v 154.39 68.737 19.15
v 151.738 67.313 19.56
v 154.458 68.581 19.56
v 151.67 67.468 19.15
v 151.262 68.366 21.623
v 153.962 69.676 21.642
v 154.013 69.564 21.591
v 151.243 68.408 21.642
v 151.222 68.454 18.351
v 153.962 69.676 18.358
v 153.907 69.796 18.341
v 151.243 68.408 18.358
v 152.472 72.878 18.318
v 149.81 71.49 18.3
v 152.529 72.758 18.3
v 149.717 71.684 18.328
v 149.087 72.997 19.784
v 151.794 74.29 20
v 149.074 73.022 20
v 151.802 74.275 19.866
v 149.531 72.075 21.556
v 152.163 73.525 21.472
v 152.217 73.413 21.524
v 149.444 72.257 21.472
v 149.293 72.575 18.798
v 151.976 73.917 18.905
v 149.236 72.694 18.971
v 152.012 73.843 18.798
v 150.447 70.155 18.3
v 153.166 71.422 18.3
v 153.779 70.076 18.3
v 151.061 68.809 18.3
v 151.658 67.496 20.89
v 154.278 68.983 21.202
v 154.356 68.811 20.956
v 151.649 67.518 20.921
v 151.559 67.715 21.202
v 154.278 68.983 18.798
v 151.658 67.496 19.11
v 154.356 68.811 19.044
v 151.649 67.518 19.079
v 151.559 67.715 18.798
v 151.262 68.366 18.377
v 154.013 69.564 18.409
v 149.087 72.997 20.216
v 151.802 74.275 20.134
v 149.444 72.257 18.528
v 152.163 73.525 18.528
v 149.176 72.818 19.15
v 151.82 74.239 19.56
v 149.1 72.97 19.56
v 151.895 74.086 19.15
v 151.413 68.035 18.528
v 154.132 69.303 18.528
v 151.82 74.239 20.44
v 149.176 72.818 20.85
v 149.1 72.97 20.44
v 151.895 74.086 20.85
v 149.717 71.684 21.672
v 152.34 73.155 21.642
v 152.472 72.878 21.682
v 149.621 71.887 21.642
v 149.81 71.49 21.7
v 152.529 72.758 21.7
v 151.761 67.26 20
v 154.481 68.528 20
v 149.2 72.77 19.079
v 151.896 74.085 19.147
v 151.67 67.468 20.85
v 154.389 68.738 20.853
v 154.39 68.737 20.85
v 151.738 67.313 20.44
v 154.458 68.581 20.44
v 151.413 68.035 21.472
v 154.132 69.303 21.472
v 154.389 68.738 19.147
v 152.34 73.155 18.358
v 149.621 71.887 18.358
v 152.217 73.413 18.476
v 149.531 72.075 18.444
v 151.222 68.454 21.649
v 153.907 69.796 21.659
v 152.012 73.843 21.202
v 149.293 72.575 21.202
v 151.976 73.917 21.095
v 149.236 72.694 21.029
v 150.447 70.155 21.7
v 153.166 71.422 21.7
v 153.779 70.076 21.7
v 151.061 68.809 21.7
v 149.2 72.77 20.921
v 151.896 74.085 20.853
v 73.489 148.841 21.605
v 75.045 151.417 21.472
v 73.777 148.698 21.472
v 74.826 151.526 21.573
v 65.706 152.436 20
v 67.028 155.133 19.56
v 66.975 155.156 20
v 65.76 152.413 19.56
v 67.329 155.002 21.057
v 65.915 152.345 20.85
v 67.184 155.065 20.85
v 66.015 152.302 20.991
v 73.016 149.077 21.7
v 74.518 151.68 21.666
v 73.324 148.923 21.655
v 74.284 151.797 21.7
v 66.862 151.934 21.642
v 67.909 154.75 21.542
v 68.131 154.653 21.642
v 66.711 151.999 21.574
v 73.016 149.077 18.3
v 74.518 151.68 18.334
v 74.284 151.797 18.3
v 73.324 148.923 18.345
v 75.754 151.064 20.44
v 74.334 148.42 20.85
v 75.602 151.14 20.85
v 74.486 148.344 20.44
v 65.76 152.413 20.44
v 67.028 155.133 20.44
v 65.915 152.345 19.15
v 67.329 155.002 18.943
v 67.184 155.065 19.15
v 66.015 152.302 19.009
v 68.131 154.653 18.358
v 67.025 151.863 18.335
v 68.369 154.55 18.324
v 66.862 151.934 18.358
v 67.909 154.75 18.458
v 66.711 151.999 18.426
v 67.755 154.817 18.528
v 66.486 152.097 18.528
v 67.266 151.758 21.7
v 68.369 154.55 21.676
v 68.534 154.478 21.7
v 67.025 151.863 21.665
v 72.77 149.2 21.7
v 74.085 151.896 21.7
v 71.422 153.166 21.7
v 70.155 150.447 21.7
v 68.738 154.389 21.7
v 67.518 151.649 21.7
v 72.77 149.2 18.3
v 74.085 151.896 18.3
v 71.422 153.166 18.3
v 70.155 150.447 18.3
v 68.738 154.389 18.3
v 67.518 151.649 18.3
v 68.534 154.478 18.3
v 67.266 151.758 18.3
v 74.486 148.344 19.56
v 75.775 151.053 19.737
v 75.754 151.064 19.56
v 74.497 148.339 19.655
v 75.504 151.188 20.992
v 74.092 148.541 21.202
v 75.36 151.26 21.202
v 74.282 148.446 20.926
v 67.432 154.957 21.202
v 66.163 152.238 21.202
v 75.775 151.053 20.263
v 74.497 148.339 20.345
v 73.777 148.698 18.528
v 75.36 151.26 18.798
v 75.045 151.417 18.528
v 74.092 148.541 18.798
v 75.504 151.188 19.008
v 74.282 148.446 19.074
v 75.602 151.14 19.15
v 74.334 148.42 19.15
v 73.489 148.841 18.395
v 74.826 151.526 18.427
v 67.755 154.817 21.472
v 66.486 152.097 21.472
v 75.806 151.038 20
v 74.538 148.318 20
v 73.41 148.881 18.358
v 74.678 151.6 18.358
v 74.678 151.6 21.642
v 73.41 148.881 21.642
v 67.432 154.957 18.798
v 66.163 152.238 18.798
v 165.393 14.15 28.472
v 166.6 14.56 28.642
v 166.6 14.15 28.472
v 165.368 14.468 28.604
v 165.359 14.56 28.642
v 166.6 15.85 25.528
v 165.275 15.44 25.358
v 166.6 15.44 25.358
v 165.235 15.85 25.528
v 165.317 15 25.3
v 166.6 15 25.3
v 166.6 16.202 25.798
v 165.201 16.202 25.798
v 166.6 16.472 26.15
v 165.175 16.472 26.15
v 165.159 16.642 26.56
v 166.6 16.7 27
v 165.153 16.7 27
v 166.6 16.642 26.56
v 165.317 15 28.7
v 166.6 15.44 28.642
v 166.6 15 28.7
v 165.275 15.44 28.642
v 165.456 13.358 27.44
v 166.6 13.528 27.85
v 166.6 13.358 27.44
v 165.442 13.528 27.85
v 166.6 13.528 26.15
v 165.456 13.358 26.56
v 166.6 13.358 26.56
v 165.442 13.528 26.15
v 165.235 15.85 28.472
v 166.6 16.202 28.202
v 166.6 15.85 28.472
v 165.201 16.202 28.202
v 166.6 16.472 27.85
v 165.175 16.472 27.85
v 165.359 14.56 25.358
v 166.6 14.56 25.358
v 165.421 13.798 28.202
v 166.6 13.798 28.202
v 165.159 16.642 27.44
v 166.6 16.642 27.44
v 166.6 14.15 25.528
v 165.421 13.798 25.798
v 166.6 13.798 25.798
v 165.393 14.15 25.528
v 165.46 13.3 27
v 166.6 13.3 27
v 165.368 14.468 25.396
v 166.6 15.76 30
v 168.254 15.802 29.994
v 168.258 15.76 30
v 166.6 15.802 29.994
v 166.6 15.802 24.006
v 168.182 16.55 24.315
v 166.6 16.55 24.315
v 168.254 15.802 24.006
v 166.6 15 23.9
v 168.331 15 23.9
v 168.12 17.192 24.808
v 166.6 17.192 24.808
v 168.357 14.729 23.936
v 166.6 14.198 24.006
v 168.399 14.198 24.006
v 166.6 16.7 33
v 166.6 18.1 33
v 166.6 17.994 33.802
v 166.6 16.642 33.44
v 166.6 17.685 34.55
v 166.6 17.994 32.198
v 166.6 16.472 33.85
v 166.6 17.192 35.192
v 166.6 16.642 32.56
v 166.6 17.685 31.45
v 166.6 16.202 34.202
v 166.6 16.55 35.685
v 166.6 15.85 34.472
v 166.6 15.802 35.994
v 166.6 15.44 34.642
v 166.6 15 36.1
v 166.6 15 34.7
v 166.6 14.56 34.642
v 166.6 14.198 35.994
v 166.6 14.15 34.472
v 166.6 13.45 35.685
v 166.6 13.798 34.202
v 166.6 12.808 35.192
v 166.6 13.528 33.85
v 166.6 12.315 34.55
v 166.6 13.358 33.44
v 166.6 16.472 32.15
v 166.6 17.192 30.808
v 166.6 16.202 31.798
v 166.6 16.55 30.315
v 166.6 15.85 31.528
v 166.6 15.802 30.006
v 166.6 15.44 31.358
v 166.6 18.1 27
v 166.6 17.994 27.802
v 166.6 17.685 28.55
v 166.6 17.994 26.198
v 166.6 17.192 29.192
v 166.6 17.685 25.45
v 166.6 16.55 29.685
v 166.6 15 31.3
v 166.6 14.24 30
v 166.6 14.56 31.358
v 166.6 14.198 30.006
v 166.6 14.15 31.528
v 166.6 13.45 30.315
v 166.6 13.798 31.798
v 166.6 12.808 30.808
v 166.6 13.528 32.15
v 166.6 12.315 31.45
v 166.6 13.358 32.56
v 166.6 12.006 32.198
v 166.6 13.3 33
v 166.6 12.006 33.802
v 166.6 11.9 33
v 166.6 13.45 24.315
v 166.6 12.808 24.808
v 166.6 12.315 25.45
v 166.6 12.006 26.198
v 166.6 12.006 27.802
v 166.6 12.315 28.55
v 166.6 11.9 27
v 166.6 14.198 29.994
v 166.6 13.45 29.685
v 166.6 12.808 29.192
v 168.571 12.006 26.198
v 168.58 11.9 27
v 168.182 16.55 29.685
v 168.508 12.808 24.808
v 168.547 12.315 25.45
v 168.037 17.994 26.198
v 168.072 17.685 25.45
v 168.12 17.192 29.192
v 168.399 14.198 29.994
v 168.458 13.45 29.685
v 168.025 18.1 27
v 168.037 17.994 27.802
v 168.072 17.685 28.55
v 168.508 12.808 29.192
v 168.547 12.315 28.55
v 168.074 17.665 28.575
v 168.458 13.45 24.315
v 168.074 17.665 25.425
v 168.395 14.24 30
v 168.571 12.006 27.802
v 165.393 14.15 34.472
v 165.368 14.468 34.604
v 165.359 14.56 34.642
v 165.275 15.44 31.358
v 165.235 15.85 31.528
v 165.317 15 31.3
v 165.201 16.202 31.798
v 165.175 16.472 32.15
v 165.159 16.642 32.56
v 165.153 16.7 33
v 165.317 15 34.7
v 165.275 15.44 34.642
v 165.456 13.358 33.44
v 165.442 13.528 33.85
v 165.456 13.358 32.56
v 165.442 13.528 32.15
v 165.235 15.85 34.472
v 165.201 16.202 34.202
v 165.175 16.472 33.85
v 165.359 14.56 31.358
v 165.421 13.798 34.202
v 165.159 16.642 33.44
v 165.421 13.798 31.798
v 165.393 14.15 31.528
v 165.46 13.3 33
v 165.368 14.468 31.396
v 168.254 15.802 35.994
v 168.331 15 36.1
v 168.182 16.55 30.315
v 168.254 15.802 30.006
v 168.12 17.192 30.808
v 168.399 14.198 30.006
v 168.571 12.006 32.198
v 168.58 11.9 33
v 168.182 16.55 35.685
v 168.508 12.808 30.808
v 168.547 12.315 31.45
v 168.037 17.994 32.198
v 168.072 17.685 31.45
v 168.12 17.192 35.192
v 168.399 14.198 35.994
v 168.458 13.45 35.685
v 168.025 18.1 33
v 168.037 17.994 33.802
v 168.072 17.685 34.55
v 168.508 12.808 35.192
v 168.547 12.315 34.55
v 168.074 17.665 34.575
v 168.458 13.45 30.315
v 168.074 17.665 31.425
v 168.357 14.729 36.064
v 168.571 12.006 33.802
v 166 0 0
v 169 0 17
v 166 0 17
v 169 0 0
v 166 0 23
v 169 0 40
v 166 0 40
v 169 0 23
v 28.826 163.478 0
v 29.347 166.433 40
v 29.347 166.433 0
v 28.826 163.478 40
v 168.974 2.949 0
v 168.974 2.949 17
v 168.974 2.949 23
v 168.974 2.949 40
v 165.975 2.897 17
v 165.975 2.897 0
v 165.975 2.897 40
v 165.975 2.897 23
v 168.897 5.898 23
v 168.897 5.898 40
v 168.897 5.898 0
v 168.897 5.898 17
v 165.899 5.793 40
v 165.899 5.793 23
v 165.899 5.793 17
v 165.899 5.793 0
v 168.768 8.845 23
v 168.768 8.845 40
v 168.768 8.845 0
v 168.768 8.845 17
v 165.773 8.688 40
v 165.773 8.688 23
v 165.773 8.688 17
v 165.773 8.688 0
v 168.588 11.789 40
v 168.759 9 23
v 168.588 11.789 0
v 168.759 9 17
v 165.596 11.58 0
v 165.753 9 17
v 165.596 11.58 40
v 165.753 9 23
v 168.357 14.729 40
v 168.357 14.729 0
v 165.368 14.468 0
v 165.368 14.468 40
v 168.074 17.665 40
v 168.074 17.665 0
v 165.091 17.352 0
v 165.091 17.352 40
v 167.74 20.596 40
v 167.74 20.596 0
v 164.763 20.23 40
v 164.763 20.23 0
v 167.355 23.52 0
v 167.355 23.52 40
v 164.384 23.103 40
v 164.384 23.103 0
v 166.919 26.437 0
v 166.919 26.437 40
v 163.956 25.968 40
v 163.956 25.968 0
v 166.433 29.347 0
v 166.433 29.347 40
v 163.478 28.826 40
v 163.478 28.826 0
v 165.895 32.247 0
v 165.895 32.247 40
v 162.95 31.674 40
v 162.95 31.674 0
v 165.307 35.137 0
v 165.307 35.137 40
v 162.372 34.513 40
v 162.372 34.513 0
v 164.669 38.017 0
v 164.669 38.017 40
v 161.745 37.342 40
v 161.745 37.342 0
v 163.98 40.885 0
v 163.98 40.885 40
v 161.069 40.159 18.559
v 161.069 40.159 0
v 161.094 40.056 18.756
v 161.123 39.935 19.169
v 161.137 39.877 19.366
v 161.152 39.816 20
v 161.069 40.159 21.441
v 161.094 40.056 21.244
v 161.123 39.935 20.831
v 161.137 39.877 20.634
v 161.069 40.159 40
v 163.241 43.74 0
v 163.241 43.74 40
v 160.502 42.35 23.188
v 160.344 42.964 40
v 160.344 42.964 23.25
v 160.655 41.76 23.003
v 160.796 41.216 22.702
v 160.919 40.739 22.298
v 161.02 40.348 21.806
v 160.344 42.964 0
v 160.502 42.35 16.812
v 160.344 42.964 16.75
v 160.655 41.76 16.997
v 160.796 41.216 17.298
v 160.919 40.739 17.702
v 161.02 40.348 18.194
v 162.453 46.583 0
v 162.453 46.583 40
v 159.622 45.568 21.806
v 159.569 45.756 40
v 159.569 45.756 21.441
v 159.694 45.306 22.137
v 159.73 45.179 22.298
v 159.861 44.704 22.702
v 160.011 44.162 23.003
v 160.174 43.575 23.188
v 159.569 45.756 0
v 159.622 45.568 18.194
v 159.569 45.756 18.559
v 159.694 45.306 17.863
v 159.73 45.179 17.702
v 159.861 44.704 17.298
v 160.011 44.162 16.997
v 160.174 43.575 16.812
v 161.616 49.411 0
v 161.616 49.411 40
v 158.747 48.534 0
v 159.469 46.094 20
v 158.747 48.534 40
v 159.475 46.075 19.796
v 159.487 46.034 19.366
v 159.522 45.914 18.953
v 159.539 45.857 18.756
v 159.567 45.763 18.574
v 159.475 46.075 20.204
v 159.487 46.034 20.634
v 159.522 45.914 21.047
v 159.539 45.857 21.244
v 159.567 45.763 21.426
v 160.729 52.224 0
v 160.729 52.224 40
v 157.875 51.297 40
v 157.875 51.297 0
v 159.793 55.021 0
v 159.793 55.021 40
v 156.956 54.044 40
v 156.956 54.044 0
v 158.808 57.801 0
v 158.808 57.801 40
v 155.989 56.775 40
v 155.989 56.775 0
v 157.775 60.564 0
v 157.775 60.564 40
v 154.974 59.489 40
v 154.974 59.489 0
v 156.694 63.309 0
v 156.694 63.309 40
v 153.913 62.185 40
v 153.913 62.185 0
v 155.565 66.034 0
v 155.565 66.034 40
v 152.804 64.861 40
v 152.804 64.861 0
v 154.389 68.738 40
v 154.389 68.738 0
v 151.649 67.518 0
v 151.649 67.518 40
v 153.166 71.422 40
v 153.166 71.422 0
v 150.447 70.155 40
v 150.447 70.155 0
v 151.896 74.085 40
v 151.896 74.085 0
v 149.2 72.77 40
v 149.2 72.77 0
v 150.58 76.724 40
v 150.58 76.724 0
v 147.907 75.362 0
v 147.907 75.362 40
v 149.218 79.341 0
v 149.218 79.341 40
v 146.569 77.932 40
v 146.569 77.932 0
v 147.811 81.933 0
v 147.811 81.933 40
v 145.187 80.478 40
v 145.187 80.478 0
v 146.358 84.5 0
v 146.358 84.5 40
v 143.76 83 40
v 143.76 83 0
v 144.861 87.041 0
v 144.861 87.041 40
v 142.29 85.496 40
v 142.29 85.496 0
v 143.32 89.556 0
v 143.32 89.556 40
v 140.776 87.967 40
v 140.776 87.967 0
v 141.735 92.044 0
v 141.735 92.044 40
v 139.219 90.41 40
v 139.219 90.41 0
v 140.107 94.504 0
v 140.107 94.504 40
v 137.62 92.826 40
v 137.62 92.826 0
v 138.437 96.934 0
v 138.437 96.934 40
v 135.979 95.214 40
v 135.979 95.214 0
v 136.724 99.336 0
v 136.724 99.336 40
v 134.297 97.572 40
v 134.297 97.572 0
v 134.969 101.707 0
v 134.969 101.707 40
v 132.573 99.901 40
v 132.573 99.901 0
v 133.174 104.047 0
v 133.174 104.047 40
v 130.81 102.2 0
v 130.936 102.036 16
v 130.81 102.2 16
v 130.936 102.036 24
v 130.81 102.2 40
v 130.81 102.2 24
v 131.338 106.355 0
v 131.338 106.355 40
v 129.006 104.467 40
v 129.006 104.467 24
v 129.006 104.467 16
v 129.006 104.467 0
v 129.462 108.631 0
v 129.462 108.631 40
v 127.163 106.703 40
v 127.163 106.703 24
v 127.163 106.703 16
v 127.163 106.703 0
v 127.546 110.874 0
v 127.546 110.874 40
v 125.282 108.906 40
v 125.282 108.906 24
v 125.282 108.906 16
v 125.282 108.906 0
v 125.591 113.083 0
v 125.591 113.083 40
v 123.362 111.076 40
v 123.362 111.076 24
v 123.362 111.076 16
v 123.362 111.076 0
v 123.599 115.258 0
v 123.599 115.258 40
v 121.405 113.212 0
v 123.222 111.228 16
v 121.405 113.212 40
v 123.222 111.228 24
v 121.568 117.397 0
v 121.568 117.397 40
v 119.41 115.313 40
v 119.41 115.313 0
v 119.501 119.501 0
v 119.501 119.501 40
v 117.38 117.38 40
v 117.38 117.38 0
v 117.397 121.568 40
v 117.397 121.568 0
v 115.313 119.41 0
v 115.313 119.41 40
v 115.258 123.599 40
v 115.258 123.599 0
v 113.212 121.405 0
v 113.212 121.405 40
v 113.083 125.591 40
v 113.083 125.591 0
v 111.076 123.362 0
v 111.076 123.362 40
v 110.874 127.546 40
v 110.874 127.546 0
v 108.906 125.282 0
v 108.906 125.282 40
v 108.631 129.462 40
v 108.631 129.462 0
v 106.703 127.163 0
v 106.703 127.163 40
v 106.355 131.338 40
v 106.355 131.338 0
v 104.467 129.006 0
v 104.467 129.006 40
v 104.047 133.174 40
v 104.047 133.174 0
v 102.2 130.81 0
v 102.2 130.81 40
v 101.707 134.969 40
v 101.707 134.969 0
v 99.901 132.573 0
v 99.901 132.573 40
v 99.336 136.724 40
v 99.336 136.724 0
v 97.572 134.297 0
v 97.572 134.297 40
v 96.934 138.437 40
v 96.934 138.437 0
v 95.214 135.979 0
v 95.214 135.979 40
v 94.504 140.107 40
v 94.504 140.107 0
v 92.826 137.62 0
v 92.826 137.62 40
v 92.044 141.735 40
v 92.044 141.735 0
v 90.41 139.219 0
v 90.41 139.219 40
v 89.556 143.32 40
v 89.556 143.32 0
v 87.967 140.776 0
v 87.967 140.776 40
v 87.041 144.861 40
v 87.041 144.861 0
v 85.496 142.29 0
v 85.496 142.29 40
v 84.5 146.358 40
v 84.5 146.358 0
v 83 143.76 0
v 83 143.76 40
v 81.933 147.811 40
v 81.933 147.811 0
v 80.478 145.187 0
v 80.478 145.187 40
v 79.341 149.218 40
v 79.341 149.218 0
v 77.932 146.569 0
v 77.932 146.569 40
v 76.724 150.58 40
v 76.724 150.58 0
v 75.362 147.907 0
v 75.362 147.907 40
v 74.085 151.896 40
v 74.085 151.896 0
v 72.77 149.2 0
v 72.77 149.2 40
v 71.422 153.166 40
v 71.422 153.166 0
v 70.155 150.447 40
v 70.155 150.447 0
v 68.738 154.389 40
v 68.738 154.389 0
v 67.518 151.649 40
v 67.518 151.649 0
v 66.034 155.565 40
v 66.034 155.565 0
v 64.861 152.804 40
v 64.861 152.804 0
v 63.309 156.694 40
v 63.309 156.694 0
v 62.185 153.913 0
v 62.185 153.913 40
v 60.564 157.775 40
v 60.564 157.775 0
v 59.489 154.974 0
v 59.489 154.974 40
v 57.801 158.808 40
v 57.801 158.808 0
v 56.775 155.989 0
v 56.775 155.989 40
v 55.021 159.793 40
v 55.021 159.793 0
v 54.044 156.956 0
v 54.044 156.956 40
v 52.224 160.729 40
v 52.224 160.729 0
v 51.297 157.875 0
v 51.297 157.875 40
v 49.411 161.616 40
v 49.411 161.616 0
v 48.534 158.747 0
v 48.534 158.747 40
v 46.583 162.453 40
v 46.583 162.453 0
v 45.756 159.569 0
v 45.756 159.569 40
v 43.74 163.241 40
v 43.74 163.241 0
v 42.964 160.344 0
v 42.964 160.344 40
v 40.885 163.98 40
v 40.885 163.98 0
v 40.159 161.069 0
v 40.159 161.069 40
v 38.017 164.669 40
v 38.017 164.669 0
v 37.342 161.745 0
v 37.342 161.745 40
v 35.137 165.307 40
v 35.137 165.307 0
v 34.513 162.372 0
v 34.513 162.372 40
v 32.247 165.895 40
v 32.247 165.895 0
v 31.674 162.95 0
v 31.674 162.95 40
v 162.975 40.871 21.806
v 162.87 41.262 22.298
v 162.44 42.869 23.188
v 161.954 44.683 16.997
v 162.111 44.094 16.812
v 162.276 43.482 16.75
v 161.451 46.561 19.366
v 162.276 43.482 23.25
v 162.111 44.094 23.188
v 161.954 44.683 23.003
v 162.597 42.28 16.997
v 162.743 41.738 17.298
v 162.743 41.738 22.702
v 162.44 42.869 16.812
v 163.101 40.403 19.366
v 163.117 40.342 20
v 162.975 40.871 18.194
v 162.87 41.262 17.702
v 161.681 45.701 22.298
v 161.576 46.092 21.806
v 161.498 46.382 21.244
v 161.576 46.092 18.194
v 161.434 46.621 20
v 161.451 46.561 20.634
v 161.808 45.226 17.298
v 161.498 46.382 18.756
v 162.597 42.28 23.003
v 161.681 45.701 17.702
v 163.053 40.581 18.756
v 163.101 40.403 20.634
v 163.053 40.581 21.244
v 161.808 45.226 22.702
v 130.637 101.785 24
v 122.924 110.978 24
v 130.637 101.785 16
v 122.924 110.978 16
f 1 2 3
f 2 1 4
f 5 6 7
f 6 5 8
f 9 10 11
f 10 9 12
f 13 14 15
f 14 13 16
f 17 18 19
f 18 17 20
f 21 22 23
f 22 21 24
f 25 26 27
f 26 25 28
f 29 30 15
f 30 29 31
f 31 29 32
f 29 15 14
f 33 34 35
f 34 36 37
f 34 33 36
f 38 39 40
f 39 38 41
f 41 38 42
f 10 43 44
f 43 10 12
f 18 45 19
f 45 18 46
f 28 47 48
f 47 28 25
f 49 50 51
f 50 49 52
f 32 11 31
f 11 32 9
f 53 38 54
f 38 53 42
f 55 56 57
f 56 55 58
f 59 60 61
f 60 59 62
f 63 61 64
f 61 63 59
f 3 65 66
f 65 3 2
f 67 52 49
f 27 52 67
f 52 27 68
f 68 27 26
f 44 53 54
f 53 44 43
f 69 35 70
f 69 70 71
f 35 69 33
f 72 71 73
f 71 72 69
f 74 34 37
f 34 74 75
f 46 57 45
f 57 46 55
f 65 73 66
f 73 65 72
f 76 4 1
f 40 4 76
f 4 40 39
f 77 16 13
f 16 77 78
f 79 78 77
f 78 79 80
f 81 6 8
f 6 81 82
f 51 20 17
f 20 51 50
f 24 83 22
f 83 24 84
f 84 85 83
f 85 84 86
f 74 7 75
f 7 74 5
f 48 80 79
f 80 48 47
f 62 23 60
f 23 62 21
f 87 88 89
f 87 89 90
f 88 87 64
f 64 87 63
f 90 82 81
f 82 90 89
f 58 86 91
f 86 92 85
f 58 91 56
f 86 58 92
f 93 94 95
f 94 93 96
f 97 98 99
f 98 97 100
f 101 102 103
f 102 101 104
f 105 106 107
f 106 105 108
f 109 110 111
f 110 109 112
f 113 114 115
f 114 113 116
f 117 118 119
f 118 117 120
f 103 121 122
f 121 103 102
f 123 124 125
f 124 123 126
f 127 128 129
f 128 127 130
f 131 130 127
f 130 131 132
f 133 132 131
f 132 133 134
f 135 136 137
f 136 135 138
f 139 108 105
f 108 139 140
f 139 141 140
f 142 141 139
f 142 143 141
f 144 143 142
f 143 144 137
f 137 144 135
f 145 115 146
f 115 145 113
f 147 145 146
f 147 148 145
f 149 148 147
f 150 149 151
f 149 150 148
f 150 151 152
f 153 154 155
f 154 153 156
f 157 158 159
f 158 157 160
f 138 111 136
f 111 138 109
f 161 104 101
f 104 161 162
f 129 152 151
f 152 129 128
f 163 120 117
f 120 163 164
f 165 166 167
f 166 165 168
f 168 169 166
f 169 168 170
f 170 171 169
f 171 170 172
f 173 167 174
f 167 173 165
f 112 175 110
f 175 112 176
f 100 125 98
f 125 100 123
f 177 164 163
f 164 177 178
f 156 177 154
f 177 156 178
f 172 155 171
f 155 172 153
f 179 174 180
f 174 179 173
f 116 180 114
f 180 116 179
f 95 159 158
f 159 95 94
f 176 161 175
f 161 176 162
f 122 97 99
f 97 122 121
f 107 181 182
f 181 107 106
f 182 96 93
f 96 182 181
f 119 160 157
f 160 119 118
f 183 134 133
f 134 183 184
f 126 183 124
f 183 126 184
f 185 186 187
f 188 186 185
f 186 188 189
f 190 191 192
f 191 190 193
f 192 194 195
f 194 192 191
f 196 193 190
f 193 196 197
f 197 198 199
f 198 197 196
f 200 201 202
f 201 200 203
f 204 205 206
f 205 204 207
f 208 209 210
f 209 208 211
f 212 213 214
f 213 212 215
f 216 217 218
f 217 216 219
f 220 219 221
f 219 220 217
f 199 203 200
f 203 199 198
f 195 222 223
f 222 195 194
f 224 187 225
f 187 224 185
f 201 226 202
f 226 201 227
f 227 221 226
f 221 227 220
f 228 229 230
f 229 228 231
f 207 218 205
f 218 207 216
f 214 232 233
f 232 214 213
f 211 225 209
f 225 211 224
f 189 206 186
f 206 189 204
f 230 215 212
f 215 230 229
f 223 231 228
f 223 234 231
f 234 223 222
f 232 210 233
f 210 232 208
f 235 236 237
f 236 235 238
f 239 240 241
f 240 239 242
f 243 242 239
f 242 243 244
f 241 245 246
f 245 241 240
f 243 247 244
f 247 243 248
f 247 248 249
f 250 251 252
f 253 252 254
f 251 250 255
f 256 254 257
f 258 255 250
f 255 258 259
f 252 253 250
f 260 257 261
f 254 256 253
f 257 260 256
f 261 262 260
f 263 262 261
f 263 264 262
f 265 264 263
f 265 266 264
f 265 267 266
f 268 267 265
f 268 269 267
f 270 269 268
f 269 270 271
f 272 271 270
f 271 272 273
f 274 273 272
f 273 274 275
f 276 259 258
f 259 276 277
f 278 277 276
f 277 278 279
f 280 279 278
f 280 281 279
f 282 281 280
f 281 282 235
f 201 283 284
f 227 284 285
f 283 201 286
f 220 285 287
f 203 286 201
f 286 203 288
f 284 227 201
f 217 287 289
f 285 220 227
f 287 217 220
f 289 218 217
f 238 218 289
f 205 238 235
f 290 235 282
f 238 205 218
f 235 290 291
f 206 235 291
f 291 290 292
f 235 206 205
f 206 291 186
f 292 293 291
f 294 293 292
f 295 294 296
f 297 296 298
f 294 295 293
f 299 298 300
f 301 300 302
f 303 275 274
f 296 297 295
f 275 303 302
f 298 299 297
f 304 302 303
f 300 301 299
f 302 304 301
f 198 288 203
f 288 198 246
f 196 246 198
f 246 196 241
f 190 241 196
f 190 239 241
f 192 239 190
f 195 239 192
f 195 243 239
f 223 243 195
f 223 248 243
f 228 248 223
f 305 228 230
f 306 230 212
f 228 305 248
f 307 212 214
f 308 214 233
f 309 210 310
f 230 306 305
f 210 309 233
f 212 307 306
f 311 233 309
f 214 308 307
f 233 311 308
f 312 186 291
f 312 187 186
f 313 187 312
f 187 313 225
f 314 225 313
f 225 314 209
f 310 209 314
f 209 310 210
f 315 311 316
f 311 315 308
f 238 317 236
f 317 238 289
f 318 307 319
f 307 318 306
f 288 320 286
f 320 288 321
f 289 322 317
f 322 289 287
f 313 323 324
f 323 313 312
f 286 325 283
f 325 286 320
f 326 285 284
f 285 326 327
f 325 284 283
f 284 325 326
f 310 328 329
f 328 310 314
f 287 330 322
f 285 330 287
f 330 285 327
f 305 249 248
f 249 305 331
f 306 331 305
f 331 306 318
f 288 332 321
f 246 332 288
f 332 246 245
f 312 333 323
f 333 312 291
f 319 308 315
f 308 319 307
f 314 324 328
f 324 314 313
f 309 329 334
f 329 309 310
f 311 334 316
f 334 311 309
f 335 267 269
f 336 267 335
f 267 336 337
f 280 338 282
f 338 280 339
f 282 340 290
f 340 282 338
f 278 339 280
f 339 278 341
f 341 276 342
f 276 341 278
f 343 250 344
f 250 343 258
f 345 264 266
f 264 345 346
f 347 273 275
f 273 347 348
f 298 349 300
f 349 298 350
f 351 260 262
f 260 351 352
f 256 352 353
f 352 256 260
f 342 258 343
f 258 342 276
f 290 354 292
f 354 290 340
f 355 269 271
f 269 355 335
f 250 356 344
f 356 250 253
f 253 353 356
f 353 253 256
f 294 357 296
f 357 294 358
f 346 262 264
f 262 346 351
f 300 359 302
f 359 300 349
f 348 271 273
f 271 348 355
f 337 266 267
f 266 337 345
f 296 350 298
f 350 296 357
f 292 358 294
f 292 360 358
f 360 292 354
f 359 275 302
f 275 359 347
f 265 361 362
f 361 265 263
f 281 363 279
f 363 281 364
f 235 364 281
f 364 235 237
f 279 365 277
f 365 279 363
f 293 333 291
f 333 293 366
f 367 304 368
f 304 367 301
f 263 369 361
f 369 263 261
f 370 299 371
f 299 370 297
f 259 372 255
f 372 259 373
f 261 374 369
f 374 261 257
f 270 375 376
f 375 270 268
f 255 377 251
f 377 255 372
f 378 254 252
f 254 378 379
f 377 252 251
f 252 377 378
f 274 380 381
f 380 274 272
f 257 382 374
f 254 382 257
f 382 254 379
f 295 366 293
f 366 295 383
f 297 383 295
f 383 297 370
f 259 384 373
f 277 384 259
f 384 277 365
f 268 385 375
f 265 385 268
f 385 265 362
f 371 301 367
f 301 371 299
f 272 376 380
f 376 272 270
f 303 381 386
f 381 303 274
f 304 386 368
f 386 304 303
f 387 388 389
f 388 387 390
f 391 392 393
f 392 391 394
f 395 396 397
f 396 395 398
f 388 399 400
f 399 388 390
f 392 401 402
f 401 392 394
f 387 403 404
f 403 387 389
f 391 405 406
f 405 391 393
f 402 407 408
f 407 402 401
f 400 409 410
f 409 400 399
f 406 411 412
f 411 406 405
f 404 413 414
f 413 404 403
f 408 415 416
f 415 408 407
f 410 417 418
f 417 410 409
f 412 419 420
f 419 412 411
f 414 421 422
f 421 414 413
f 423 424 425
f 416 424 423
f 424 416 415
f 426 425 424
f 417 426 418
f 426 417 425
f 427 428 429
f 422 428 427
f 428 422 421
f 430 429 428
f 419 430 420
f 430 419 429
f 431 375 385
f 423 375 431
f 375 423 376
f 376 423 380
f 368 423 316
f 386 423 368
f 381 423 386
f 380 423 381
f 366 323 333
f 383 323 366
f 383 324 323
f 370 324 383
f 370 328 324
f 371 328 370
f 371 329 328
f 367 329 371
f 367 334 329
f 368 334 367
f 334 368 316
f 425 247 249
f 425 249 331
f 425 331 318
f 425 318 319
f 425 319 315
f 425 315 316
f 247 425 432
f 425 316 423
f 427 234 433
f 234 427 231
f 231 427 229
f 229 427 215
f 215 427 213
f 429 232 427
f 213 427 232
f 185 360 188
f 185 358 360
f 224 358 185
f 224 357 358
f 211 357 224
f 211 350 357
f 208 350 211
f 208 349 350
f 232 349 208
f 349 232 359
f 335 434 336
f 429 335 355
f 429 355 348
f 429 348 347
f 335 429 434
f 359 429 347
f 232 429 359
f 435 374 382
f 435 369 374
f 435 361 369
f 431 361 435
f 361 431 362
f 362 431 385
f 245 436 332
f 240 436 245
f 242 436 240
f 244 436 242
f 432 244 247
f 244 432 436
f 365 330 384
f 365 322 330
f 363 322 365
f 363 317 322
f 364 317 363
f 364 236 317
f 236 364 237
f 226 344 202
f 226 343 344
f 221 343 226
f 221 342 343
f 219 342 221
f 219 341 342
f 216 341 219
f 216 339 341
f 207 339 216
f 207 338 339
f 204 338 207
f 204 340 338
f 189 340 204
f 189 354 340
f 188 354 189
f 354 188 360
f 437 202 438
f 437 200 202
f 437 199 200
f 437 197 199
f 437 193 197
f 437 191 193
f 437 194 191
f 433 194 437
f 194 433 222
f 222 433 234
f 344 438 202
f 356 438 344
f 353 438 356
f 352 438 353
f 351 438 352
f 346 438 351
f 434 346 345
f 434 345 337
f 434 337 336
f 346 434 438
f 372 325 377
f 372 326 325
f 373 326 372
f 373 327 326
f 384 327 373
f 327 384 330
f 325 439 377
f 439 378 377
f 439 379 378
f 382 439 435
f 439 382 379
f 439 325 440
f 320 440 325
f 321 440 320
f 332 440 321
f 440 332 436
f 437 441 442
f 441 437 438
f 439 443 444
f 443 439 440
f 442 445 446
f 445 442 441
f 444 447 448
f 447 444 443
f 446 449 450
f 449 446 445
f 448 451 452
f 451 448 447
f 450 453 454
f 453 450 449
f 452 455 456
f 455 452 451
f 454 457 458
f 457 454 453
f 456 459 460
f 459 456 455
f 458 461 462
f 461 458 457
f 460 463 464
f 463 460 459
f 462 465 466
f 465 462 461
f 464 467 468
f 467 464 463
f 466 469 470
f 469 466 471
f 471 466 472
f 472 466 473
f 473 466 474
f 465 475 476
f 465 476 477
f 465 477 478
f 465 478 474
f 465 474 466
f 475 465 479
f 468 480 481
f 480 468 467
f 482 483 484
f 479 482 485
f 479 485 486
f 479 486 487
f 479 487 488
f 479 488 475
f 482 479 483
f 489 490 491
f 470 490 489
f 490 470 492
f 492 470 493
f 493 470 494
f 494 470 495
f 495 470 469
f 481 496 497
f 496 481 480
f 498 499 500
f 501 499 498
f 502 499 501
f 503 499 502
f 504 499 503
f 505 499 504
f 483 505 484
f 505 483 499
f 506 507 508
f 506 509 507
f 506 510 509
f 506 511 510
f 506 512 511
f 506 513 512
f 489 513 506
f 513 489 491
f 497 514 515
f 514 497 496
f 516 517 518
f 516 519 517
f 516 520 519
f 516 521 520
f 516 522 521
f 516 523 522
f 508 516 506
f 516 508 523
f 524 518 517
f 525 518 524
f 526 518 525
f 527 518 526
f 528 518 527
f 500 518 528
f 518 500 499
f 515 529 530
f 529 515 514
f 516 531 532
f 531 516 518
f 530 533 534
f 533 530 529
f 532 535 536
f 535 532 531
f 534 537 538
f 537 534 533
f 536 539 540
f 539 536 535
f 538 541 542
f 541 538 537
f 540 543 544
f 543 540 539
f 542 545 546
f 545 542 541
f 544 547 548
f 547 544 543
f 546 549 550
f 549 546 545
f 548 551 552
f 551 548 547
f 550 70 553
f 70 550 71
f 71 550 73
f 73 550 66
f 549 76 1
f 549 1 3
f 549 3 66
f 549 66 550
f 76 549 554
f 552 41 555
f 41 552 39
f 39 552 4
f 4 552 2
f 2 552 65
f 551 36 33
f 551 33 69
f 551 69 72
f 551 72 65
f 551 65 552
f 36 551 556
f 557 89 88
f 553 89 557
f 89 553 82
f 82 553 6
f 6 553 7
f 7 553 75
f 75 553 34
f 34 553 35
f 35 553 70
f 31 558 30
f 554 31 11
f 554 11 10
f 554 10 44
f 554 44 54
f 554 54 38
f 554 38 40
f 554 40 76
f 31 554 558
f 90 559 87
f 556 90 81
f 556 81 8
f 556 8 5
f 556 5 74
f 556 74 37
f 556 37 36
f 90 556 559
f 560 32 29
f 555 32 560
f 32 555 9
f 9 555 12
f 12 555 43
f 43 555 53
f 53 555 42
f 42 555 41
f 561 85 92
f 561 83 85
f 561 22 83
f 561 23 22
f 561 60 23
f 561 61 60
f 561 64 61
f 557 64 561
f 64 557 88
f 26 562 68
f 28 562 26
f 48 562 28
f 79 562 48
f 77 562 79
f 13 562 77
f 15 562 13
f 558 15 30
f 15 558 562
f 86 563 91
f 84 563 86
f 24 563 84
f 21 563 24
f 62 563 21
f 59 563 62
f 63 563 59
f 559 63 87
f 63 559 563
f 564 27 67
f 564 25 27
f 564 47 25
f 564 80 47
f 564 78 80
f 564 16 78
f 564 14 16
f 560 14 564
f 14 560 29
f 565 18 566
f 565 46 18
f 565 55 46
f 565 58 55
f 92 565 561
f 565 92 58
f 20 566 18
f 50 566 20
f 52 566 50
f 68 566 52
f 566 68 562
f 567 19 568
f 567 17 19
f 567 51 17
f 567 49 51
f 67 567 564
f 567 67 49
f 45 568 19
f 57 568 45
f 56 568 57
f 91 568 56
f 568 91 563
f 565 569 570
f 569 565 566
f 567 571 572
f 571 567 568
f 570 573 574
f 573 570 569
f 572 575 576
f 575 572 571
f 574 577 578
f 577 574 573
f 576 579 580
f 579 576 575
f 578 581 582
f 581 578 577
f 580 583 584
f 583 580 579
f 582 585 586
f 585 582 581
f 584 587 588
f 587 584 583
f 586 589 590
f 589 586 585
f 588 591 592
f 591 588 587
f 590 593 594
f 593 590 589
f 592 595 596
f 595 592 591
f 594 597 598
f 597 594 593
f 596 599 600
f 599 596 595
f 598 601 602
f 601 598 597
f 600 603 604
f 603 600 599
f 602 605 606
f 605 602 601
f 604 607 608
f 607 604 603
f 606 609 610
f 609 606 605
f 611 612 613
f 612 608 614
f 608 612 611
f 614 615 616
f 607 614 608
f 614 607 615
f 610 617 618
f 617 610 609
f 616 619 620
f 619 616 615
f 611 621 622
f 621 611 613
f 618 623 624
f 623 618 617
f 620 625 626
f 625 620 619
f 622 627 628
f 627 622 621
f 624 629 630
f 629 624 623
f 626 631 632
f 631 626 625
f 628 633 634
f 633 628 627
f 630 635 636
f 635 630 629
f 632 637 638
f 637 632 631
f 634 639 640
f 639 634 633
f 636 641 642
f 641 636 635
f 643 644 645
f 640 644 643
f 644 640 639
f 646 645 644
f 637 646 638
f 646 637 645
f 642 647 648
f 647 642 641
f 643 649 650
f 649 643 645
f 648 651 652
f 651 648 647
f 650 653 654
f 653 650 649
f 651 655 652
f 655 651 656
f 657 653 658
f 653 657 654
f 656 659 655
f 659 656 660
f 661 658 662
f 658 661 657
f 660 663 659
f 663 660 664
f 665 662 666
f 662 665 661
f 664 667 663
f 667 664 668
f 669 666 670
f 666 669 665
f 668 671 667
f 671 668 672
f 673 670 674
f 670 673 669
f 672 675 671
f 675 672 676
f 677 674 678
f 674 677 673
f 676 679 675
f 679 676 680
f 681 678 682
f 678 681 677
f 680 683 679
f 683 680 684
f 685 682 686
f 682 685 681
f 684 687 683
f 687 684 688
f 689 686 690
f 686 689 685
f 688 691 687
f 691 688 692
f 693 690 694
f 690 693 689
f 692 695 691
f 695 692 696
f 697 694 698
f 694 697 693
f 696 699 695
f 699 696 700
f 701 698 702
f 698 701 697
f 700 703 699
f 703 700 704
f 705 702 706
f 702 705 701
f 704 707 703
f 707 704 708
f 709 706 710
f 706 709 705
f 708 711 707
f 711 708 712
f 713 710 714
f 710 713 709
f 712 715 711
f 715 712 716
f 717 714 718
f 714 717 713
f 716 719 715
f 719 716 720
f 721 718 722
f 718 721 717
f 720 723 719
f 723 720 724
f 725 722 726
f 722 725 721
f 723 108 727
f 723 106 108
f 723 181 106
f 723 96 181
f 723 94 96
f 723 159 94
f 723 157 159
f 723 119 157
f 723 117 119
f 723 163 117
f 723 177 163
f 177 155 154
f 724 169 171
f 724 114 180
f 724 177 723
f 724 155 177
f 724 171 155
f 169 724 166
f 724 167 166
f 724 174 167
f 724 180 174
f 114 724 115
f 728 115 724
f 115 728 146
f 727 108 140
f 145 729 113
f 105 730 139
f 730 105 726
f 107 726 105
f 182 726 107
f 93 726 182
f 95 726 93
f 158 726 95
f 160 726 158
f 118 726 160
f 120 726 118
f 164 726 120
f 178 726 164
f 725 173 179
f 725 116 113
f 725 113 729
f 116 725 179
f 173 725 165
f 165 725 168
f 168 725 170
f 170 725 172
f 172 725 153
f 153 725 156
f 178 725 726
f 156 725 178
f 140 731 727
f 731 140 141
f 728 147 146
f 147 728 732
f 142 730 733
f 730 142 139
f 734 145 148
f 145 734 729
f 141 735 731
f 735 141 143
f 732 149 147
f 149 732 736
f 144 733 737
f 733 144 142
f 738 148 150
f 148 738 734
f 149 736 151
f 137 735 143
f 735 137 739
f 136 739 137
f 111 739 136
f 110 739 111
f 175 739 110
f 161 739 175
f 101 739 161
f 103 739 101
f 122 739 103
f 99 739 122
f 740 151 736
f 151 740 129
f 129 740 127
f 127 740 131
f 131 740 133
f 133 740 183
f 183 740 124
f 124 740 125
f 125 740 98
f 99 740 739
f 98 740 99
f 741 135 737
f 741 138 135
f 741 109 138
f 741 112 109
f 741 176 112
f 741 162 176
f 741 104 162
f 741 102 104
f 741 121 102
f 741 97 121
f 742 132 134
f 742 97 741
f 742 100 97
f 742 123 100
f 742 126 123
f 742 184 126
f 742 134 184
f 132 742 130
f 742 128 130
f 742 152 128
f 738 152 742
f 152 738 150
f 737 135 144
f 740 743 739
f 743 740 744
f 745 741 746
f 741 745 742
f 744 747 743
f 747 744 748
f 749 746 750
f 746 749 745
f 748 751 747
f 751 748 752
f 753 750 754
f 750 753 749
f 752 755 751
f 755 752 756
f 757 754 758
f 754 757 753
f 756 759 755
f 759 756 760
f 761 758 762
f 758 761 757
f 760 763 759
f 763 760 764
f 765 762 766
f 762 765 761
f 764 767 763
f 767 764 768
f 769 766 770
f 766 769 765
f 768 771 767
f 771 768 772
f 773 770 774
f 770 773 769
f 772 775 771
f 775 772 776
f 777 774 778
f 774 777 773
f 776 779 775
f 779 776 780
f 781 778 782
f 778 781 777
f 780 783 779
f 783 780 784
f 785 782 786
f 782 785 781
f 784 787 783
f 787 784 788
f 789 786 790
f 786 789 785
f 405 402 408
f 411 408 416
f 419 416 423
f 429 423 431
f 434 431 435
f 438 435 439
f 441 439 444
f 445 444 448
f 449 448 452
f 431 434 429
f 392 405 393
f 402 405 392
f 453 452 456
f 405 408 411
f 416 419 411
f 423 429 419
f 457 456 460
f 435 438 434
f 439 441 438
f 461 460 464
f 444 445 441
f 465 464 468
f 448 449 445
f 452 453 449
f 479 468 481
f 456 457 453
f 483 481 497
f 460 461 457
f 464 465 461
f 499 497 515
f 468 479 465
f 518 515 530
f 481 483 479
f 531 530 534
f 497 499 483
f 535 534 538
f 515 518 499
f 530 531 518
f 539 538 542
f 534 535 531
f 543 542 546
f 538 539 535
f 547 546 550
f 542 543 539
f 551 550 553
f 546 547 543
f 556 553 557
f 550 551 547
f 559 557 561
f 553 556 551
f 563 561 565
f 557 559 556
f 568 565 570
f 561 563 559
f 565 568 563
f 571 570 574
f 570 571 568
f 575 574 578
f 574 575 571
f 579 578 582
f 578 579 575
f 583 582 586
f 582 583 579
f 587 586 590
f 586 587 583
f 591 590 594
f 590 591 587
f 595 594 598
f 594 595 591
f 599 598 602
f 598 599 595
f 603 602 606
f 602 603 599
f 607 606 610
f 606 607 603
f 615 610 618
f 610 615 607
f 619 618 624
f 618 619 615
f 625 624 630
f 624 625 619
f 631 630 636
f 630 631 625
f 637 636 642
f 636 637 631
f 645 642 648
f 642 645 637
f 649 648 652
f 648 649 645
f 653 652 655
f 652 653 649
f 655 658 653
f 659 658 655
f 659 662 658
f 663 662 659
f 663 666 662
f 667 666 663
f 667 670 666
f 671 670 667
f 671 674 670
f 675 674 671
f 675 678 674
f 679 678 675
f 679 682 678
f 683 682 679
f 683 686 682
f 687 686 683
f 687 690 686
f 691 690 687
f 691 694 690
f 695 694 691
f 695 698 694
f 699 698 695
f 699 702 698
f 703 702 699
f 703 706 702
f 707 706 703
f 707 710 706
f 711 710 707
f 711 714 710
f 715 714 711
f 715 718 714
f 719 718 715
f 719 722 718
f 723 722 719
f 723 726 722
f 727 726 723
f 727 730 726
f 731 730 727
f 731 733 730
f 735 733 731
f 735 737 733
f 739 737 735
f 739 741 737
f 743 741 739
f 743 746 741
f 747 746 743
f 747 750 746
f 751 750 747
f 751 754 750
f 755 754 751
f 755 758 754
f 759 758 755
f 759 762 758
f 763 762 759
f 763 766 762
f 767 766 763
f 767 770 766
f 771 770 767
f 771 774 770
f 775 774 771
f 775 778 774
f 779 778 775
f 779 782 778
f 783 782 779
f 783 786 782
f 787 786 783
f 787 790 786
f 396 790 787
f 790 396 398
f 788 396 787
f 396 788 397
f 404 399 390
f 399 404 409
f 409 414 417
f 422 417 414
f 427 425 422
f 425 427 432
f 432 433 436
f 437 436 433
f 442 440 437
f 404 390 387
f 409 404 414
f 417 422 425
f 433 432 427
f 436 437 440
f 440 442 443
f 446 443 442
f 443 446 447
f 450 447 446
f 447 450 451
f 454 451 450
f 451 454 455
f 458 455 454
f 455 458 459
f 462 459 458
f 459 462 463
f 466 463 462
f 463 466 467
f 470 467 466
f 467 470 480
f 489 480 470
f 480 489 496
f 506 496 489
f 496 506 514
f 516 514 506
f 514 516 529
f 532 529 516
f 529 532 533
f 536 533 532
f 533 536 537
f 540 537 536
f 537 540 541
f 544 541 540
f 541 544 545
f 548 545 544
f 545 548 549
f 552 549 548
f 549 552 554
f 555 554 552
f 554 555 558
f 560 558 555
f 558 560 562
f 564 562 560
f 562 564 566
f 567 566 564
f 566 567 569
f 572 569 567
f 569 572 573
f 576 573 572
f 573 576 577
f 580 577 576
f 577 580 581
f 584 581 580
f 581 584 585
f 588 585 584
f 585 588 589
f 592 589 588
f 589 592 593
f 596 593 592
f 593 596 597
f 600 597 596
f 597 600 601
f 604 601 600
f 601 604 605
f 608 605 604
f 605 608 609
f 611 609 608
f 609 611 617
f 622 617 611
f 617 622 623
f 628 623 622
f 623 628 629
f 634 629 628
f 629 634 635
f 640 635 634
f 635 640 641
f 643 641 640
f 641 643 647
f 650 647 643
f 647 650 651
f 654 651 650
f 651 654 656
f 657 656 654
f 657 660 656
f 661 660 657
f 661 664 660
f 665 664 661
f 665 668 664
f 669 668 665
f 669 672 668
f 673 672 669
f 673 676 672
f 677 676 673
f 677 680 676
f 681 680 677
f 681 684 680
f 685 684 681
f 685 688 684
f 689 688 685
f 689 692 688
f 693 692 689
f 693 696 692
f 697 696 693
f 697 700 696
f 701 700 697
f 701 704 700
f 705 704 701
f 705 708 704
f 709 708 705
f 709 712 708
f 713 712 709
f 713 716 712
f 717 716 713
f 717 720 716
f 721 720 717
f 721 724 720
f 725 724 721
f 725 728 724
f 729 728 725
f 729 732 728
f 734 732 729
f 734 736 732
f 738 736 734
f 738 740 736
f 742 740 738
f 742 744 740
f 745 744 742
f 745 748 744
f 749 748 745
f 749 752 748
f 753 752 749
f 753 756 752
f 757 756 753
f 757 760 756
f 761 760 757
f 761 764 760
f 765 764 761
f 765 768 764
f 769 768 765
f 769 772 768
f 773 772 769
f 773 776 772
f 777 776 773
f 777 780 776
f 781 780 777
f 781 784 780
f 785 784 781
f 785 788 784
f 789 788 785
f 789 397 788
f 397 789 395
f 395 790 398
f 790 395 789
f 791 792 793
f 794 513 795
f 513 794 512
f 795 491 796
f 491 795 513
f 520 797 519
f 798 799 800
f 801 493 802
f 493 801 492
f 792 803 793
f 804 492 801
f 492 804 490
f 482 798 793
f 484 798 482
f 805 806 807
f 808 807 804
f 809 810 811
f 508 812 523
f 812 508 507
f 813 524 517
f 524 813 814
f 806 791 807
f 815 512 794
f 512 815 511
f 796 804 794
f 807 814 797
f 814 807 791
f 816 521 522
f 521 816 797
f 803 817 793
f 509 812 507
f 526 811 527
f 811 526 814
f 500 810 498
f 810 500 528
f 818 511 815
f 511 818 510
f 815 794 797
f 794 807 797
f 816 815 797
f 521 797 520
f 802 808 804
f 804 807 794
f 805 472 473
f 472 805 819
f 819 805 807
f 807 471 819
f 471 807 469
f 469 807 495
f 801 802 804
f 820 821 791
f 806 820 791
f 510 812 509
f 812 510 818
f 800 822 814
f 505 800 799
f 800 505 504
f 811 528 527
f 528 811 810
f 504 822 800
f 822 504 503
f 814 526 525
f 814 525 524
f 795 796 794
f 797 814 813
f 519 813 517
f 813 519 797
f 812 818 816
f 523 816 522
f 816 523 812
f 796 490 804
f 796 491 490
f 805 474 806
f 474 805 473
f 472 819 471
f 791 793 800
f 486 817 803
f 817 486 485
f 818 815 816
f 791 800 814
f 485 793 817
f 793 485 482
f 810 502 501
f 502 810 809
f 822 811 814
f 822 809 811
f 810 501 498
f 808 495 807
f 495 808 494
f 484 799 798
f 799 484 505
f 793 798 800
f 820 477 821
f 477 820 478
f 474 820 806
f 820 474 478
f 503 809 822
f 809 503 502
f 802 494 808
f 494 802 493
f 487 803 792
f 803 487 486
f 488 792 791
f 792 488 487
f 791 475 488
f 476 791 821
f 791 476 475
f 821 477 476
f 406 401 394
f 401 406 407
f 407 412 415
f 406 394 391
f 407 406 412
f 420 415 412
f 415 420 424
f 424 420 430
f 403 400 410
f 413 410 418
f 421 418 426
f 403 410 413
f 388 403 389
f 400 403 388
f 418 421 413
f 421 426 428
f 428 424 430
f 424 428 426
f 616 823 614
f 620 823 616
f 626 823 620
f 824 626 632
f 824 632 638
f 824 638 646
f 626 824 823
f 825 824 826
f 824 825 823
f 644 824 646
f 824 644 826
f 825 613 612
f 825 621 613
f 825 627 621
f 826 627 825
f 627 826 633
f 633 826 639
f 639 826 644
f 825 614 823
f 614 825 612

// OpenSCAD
// =====================================================================
//  robot base :: front bumper, LEFT half 0 .. +80 deg (print 1; right half = mirror)
//  Band r 166 .. 169, z 22 .. 62 (the legacy model's front half-ring band).
//    - 2 slots (3.4 x 10.4, long along X) at 25 / 65 deg, z 42 for radial M3 shoulder screws
//    - spring seat d 6.5 x 2 deep (radial) on the inner face at 15 deg, z 42
//    - switch strike pad on the inner face at 40 deg (12 tangential x 8 tall, 0.5 proud: 0.1 off the switch lever tip at rest)
//    - ToF window 18 x 6 at 0 deg split across both halves (9 per half), z 42
//    - splice plate screws: 2x M3 (z 49 / 55) at y +15, counterbored 6.2 x 2 on the outer face,
//      M3 along X into robot_bumper_splice (M3x8).
//  Print orientation: standing on its bottom edge (band vertical), no supports.
//  robot_bumper_left()  robot frame.   NOTE: the lid wall needs a ToF window and a relief for
//  the splice plate at 0 deg (see report).
// =====================================================================
include <../lib/params.scad>
include <../lib/robot_params.scad>

rbb_ri = rb_bumper_r[0];  rbb_ro = rb_bumper_r[1];
rbb_z0 = rb_bumper_z[0];  rbb_z1 = rb_bumper_z[1];
rbb_mid = rb_bumper_mid_z;
rbb_slot_len = rb_bumper_travel + 6.4;
rbb_splice_y = 15;  rbb_splice_z = [49, 55];

module rbb_left_body() {
    difference() {
        rotate_extrude(angle = rb_bumper_ang, $fn = 360)
            translate([rbb_ri, rbb_z0]) square([rbb_ro - rbb_ri, rbb_z1 - rbb_z0]);
        // M3 shoulder-screw slots (hull of 2 radial cylinders, ends along X)
        for (a = [25, 65]) {
            pt = rbb_ro * [cos(a), sin(a)];
            hull() for (s = [-1, 1])
                translate([pt[0] + s * (rbb_slot_len - 3.4) / 2, pt[1], rbb_mid])
                    rotate([0, 90, a]) translate([0, 0, -8]) cylinder(h = 16, d = 3.4, $fn = 24);
        }
        // spring seat (radial pocket on the inner face)
        rotate([0, 0, 15]) translate([rbb_ri - 1, 0, rbb_mid]) rotate([0, 90, 0]) cylinder(h = 3, d = 6.5, $fn = 32);
        // ToF window half
        translate([rbb_ri - 1, -0.01, rbb_mid - 3]) cube([rbb_ro - rbb_ri + 2, 9.01, 6]);
        // splice screws (counterbored from outside)
        for (z = rbb_splice_z) translate([0, rbb_splice_y, z]) rotate([0, 90, 0]) {
            translate([0, 0, rbb_ri - 2]) cylinder(h = 6, d = m3_clear, $fn = 24);
            translate([0, 0, 166.6]) cylinder(h = 6, d = 6.2, $fn = 24);
        }
    }
    // strike pad
    intersection() {
        rotate([0, 0, 40]) translate([rbb_ri - 0.5, -6, rbb_mid - 4]) cube([1.5, 12, 8]);
        cylinder(h = 100, r = 200);
    }
}

module robot_bumper_left() { rbb_left_body(); }
module robot_bumper_left_print() { translate([0, 0, -rbb_z0]) robot_bumper_left(); }

robot_bumper_left_print();
